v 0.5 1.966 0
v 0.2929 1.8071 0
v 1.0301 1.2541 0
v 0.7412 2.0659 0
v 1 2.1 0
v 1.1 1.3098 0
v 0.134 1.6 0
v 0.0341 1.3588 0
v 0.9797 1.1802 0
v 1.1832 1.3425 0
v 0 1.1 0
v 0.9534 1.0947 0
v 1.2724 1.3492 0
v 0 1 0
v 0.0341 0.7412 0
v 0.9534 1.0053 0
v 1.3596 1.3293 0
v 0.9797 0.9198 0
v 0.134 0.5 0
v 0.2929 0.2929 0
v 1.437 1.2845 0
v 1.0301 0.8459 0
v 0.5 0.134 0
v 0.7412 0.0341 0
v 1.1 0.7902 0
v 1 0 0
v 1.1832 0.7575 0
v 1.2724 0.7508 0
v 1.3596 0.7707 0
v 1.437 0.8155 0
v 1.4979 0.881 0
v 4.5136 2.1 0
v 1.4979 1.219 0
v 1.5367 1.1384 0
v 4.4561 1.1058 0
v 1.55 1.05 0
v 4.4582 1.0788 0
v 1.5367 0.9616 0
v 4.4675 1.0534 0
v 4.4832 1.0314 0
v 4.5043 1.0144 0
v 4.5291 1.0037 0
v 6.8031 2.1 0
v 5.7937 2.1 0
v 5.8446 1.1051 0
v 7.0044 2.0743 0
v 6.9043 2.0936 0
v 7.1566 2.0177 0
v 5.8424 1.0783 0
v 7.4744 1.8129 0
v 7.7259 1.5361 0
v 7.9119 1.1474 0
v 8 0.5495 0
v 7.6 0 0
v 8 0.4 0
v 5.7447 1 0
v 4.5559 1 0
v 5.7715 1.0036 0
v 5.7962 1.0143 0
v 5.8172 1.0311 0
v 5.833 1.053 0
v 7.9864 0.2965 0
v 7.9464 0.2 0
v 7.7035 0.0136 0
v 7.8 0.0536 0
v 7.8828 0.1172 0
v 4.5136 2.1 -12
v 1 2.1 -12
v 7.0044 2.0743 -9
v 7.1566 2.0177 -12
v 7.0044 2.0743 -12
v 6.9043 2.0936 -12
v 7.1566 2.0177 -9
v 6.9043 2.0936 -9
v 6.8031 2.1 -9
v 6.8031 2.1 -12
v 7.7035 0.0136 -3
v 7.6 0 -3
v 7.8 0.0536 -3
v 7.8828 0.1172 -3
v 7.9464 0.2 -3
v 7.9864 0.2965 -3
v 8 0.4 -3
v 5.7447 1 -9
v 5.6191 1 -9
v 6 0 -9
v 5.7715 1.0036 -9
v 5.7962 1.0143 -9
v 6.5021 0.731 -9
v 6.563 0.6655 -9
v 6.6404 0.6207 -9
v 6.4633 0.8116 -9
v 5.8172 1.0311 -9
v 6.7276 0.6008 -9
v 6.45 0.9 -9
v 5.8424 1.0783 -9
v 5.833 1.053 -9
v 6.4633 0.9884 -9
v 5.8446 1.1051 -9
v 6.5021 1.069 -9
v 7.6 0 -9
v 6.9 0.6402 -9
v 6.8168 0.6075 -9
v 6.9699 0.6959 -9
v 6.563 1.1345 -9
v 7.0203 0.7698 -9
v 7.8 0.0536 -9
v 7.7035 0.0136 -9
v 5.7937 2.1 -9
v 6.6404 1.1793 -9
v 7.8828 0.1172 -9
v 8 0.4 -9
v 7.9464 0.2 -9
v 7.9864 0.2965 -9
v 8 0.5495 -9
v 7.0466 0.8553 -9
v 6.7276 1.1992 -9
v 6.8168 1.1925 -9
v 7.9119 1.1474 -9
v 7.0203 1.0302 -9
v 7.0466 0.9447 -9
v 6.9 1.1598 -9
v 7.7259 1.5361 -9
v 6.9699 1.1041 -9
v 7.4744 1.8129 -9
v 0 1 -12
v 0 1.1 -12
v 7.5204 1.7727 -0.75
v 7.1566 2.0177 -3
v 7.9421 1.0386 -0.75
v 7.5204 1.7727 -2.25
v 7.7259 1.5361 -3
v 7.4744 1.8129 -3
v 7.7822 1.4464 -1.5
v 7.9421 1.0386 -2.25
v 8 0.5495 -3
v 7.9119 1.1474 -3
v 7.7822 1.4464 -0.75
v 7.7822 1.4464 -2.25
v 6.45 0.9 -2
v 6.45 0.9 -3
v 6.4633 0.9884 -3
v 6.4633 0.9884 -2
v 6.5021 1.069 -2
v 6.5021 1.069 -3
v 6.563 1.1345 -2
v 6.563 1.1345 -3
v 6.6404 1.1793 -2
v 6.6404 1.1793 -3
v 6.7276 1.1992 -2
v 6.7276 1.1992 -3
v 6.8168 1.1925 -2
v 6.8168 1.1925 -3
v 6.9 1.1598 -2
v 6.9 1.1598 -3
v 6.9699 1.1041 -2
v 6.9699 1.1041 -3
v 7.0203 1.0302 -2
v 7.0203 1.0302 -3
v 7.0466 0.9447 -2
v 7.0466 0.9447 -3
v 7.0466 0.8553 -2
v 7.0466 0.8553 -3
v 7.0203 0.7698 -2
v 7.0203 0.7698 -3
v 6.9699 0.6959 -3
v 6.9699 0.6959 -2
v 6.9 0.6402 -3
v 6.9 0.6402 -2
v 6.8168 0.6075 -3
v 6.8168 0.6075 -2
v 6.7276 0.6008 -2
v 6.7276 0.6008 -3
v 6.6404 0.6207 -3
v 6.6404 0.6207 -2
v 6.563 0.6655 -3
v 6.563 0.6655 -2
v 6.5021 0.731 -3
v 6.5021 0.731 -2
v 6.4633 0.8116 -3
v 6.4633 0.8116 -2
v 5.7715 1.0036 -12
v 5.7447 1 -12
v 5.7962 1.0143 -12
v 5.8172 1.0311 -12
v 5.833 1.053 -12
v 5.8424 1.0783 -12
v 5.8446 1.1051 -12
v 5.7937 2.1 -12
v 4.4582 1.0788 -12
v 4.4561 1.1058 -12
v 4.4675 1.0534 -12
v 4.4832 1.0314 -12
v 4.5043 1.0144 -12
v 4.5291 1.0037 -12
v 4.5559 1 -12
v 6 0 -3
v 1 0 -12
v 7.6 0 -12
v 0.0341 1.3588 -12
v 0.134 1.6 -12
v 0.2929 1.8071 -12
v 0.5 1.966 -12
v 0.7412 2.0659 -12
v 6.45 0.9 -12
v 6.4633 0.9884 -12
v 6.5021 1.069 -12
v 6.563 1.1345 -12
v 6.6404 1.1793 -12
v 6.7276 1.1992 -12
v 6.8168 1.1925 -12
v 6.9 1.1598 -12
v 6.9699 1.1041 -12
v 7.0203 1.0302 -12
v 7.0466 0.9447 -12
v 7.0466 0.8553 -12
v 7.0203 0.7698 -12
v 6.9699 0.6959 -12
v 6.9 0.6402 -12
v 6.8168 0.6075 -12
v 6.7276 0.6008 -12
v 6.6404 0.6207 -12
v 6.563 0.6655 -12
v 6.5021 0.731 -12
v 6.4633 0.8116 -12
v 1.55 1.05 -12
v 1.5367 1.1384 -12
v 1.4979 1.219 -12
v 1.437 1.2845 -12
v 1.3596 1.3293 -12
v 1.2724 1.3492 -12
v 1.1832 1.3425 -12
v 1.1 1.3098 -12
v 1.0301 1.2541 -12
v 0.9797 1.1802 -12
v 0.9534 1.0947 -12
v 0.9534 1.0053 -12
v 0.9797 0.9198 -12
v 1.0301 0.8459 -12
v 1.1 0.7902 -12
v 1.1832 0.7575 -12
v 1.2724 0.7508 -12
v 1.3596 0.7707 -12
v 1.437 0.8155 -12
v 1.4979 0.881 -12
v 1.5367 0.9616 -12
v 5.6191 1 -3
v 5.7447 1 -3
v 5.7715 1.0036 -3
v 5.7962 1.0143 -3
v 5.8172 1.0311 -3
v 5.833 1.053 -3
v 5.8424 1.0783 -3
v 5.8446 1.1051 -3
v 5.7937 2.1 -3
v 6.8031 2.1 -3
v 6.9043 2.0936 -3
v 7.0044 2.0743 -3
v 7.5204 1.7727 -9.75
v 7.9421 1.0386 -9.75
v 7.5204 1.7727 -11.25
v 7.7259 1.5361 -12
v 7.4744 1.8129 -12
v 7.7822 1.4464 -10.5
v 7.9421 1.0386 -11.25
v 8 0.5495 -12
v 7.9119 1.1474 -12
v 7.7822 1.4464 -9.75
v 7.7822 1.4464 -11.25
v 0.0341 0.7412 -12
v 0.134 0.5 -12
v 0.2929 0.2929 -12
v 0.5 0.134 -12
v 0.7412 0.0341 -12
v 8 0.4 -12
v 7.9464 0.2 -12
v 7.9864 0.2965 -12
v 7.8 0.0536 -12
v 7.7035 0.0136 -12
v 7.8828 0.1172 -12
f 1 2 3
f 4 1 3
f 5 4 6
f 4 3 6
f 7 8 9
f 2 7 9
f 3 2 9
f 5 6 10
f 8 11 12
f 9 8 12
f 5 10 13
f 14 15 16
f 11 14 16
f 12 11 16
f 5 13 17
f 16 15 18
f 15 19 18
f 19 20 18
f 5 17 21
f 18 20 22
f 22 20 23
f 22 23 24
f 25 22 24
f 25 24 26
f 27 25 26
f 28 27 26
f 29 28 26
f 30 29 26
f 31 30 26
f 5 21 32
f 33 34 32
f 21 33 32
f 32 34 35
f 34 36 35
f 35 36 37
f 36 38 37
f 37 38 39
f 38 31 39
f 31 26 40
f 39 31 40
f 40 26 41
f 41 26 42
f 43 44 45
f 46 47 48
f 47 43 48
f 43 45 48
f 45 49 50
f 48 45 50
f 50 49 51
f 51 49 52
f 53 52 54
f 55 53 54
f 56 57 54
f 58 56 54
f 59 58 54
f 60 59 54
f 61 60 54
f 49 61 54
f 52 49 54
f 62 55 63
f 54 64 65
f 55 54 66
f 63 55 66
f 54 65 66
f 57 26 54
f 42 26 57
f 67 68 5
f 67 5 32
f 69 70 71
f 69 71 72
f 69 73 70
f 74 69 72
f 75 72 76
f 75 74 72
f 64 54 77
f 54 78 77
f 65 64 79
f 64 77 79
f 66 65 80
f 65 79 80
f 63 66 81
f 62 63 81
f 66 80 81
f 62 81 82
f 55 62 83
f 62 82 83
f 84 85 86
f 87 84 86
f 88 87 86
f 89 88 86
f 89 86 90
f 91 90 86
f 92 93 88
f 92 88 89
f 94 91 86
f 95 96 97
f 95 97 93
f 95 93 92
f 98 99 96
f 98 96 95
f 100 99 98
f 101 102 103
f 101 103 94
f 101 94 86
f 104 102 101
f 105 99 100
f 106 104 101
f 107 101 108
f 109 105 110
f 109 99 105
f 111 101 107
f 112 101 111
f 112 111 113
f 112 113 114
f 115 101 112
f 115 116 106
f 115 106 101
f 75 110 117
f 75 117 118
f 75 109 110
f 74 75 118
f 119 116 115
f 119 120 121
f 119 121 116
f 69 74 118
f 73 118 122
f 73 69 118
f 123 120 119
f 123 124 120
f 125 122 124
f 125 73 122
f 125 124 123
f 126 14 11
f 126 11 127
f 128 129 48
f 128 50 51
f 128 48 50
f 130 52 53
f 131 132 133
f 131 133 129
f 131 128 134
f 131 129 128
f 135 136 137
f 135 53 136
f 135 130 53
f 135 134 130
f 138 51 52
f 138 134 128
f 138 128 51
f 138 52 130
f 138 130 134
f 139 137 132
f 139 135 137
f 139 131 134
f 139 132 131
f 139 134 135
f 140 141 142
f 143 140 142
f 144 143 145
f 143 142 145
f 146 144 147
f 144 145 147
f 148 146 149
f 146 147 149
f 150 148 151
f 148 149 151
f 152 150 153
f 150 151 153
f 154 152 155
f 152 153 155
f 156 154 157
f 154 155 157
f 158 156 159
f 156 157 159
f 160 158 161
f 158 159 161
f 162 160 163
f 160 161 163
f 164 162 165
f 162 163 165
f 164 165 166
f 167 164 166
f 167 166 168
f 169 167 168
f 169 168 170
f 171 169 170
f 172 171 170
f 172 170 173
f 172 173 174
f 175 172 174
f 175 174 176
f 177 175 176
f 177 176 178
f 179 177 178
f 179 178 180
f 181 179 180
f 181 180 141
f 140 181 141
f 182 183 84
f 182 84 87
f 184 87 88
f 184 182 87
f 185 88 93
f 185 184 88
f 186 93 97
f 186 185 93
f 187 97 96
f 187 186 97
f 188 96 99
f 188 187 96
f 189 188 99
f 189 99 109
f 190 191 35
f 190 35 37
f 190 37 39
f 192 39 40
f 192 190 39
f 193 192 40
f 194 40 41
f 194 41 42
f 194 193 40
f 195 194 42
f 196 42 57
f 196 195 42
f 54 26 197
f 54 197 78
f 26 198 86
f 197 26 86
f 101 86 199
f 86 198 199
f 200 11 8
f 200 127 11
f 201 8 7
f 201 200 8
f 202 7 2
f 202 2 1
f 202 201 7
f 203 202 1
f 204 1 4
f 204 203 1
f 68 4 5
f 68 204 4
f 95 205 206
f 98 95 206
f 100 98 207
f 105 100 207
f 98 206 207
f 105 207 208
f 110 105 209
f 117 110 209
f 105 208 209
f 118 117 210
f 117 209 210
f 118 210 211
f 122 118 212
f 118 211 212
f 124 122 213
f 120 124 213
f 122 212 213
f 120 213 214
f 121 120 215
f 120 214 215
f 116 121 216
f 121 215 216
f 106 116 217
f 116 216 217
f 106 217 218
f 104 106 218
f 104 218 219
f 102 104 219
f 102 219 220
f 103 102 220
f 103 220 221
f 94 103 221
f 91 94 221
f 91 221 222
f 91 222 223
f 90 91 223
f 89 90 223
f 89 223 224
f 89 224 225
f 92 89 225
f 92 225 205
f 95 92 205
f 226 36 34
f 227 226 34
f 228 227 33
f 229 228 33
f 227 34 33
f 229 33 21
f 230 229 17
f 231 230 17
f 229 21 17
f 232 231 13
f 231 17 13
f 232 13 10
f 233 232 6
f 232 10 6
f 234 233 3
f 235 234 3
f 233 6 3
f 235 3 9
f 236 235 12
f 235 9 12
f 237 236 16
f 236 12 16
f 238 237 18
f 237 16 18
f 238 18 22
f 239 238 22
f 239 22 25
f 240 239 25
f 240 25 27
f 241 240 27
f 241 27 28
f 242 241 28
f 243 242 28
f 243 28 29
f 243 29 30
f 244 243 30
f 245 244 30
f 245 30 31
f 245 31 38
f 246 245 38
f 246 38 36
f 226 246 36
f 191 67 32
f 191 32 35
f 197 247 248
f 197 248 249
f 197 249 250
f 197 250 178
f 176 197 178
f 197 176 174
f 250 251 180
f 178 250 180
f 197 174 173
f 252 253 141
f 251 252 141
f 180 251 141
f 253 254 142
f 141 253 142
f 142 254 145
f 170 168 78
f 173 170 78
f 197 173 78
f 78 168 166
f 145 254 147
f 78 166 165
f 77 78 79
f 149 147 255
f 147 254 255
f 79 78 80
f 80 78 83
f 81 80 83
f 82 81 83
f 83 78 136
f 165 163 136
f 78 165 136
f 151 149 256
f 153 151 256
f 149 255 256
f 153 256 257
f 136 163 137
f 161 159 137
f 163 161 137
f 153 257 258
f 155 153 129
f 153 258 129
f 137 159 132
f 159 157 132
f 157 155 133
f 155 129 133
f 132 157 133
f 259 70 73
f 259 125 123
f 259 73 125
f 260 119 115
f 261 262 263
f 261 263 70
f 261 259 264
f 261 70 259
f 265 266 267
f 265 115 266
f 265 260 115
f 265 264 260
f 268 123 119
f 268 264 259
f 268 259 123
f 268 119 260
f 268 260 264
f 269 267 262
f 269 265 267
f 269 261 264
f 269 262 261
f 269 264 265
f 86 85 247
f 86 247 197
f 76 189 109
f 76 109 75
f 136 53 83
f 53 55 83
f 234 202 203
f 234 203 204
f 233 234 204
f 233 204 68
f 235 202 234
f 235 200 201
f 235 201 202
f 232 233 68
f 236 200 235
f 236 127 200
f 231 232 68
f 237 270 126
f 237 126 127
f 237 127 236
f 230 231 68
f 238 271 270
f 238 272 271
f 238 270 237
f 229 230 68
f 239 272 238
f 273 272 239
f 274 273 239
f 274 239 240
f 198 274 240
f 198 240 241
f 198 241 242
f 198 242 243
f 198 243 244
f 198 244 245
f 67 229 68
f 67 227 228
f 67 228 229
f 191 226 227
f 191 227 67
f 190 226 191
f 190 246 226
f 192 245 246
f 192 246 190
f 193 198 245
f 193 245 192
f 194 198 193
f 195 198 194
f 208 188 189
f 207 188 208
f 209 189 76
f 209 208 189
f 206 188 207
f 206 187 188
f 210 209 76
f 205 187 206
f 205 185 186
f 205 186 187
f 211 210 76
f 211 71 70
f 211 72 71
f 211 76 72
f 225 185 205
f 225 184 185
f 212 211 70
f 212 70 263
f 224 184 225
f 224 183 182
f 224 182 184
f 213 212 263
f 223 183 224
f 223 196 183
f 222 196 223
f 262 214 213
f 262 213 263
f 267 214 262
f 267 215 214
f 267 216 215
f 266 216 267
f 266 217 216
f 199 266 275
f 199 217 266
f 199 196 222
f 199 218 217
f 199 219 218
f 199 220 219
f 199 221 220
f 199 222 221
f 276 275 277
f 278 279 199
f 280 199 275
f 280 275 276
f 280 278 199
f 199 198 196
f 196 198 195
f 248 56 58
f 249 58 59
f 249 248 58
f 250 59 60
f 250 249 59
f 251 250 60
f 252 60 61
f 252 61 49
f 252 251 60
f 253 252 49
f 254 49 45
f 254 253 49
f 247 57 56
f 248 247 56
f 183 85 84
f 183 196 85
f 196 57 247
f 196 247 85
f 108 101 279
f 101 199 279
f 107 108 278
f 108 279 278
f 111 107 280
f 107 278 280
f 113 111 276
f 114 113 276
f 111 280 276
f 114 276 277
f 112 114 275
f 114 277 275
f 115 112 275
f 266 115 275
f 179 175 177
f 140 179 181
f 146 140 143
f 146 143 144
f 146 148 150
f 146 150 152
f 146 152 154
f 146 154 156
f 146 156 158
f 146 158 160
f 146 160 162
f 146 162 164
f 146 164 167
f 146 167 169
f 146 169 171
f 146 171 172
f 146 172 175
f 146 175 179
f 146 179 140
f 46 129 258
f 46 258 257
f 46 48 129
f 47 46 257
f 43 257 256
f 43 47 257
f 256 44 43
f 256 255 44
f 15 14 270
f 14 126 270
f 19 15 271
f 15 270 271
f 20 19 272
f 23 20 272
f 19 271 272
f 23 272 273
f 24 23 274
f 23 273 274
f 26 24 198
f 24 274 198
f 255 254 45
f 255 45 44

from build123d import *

# Parameters (mm, degrees)
SKETCH1_W                = 8
SKETCH1_H                = 12
BOSS_EXTRUDE1_DEPTH      = 2.1
SKETCH2_W                = 2
SKETCH2_H                = 6
CUT_EXTRUDE1_DEPTH       = 2.1
CUT_EXTRUDE4_START       = -12
CUT_EXTRUDE4_DEPTH       = 12
SKETCH4_W                = 6
SKETCH4_H                = 1.1
CUT_EXTRUDE5_DEPTH       = 0.5
CUT_EXTRUDE14_DEPTH      = 6
FILLET1_R                = 1
FILLET2_R                = 0.4
CUT_EXTRUDE15_DEPTH      = 15.574292436
CUT_EXTRUDE15_DEPTH_BACK = 15.574292436
SKETCH8_R                = 0.3
CUT_EXTRUDE16_DEPTH      = 15.574292587
SKETCH9_R                = 0.3
CUT_EXTRUDE17_DEPTH      = 10
FILLET4_R                = 0.8


# Read off the part's stored shape, not the designer's step: Cut-Extrude4
with BuildPart() as part:
    # Sketch1 → Boss-Extrude1 (new body)
    with BuildSketch(Plane(origin=(0, 0, 0), x_dir=(1, 0, 0), z_dir=(0, 1, 0))):
        with Locations((4, 6)):
            Rectangle(SKETCH1_W, SKETCH1_H)
    extrude(amount=BOSS_EXTRUDE1_DEPTH)

    # Sketch2 → Cut-Extrude1 (cut)
    with BuildSketch(Plane(origin=(0, 2.1, 0), x_dir=(1, 0, 0), z_dir=(0, 1, 0))):
        with Locations((7, 6)):
            Rectangle(SKETCH2_W, SKETCH2_H)
    extrude(amount=-CUT_EXTRUDE1_DEPTH, mode=Mode.SUBTRACT)

    # Cut-Extrude4 outline → Cut-Extrude4 (cut)
    with BuildSketch(Plane.XY.offset(CUT_EXTRUDE4_START)):
        with BuildLine():
            ThreePointArc((5.744749223, 1), (5.817245121, 1.031120796), (5.844618418, 1.105113104))
            Line((5.844618418, 1.105113104), (5.793682188, 2.1))
            Line((5.793682188, 2.1), (4.513567693, 2.1))
            Line((4.513567693, 2.1), (4.45611228, 1.105769256))
            ThreePointArc((4.45611228, 1.105769256), (4.483223902, 1.031359362), (4.555945719, 1))
            Line((4.555945719, 1), (5.744749223, 1))
        make_face()
    extrude(amount=CUT_EXTRUDE4_DEPTH, mode=Mode.SUBTRACT)

    # Sketch4 → Cut-Extrude5 (cut)
    with BuildSketch(Plane(origin=(6, 0, 0), x_dir=(0, 0, -1), z_dir=(1, 0, 0))):
        with Locations((6, 1.55)):
            Rectangle(SKETCH4_W, SKETCH4_H)
    extrude(amount=-CUT_EXTRUDE5_DEPTH, mode=Mode.SUBTRACT)

    # Sketch6 → Cut-Extrude14 (cut)
    with BuildSketch(Plane.XY.offset(-9)):
        Polygon((6, 0), (6, 1), (5.619051105, 1), align=None)
    extrude(amount=CUT_EXTRUDE14_DEPTH, mode=Mode.SUBTRACT)

    # Fillet1
    fillet1_edges = [part.edges().sort_by_distance(p)[0] for p in [
        (0, 2.1, -6),
        (0, 0, -6),
    ]]
    fillet(fillet1_edges, radius=FILLET1_R)

    # Fillet2
    fillet2_edges = [part.edges().sort_by_distance(p)[0] for p in [
        (8, 0, -10.5),
        (8, 0, -1.5),
    ]]
    fillet(fillet2_edges, radius=FILLET2_R)

    # Sketch7 → Cut-Extrude15 (cut, two sides: drawn at the far end of the back side and taken through both)
    with BuildSketch(Plane.XY.offset(-CUT_EXTRUDE15_DEPTH_BACK)):
        with BuildLine():
            Line((8, 2.1), (6.963365026, 2.1))
            add(Edge.make_bspline(
                [(6.963365026, 2.1), (7.9845252, 1.726197455), (8, 0.549529298)],
                knots=[0, 0, 0, 0.970144169, 0.970144169, 0.970144169], degree=2))
            Line((8, 0.549529298), (8, 2.1))
        make_face()
    extrude(amount=CUT_EXTRUDE15_DEPTH + CUT_EXTRUDE15_DEPTH_BACK, mode=Mode.SUBTRACT)

    # Sketch8 → Cut-Extrude16 (cut, through all)
    with BuildSketch(Plane.XY):
        with Locations((1.25, 1.05)):
            Circle(SKETCH8_R)
    extrude(amount=-CUT_EXTRUDE16_DEPTH, mode=Mode.SUBTRACT)

    # Sketch9 → Cut-Extrude17 (cut)
    with BuildSketch(Plane(origin=(0, 0, -12), x_dir=(-1, 0, 0), z_dir=(0, 0, -1))):
        with Locations((-6.75, 0.9)):
            Circle(SKETCH9_R)
    extrude(amount=-CUT_EXTRUDE17_DEPTH, mode=Mode.SUBTRACT)

    # Fillet4
    fillet4_edges = [part.edges().sort_by_distance(p)[0] for p in [
        (6.963365026, 2.1, -10.5),
        (6.963365026, 2.1, -1.5),
    ]]
    fillet(fillet4_edges, radius=FILLET4_R)


solid = part.part
